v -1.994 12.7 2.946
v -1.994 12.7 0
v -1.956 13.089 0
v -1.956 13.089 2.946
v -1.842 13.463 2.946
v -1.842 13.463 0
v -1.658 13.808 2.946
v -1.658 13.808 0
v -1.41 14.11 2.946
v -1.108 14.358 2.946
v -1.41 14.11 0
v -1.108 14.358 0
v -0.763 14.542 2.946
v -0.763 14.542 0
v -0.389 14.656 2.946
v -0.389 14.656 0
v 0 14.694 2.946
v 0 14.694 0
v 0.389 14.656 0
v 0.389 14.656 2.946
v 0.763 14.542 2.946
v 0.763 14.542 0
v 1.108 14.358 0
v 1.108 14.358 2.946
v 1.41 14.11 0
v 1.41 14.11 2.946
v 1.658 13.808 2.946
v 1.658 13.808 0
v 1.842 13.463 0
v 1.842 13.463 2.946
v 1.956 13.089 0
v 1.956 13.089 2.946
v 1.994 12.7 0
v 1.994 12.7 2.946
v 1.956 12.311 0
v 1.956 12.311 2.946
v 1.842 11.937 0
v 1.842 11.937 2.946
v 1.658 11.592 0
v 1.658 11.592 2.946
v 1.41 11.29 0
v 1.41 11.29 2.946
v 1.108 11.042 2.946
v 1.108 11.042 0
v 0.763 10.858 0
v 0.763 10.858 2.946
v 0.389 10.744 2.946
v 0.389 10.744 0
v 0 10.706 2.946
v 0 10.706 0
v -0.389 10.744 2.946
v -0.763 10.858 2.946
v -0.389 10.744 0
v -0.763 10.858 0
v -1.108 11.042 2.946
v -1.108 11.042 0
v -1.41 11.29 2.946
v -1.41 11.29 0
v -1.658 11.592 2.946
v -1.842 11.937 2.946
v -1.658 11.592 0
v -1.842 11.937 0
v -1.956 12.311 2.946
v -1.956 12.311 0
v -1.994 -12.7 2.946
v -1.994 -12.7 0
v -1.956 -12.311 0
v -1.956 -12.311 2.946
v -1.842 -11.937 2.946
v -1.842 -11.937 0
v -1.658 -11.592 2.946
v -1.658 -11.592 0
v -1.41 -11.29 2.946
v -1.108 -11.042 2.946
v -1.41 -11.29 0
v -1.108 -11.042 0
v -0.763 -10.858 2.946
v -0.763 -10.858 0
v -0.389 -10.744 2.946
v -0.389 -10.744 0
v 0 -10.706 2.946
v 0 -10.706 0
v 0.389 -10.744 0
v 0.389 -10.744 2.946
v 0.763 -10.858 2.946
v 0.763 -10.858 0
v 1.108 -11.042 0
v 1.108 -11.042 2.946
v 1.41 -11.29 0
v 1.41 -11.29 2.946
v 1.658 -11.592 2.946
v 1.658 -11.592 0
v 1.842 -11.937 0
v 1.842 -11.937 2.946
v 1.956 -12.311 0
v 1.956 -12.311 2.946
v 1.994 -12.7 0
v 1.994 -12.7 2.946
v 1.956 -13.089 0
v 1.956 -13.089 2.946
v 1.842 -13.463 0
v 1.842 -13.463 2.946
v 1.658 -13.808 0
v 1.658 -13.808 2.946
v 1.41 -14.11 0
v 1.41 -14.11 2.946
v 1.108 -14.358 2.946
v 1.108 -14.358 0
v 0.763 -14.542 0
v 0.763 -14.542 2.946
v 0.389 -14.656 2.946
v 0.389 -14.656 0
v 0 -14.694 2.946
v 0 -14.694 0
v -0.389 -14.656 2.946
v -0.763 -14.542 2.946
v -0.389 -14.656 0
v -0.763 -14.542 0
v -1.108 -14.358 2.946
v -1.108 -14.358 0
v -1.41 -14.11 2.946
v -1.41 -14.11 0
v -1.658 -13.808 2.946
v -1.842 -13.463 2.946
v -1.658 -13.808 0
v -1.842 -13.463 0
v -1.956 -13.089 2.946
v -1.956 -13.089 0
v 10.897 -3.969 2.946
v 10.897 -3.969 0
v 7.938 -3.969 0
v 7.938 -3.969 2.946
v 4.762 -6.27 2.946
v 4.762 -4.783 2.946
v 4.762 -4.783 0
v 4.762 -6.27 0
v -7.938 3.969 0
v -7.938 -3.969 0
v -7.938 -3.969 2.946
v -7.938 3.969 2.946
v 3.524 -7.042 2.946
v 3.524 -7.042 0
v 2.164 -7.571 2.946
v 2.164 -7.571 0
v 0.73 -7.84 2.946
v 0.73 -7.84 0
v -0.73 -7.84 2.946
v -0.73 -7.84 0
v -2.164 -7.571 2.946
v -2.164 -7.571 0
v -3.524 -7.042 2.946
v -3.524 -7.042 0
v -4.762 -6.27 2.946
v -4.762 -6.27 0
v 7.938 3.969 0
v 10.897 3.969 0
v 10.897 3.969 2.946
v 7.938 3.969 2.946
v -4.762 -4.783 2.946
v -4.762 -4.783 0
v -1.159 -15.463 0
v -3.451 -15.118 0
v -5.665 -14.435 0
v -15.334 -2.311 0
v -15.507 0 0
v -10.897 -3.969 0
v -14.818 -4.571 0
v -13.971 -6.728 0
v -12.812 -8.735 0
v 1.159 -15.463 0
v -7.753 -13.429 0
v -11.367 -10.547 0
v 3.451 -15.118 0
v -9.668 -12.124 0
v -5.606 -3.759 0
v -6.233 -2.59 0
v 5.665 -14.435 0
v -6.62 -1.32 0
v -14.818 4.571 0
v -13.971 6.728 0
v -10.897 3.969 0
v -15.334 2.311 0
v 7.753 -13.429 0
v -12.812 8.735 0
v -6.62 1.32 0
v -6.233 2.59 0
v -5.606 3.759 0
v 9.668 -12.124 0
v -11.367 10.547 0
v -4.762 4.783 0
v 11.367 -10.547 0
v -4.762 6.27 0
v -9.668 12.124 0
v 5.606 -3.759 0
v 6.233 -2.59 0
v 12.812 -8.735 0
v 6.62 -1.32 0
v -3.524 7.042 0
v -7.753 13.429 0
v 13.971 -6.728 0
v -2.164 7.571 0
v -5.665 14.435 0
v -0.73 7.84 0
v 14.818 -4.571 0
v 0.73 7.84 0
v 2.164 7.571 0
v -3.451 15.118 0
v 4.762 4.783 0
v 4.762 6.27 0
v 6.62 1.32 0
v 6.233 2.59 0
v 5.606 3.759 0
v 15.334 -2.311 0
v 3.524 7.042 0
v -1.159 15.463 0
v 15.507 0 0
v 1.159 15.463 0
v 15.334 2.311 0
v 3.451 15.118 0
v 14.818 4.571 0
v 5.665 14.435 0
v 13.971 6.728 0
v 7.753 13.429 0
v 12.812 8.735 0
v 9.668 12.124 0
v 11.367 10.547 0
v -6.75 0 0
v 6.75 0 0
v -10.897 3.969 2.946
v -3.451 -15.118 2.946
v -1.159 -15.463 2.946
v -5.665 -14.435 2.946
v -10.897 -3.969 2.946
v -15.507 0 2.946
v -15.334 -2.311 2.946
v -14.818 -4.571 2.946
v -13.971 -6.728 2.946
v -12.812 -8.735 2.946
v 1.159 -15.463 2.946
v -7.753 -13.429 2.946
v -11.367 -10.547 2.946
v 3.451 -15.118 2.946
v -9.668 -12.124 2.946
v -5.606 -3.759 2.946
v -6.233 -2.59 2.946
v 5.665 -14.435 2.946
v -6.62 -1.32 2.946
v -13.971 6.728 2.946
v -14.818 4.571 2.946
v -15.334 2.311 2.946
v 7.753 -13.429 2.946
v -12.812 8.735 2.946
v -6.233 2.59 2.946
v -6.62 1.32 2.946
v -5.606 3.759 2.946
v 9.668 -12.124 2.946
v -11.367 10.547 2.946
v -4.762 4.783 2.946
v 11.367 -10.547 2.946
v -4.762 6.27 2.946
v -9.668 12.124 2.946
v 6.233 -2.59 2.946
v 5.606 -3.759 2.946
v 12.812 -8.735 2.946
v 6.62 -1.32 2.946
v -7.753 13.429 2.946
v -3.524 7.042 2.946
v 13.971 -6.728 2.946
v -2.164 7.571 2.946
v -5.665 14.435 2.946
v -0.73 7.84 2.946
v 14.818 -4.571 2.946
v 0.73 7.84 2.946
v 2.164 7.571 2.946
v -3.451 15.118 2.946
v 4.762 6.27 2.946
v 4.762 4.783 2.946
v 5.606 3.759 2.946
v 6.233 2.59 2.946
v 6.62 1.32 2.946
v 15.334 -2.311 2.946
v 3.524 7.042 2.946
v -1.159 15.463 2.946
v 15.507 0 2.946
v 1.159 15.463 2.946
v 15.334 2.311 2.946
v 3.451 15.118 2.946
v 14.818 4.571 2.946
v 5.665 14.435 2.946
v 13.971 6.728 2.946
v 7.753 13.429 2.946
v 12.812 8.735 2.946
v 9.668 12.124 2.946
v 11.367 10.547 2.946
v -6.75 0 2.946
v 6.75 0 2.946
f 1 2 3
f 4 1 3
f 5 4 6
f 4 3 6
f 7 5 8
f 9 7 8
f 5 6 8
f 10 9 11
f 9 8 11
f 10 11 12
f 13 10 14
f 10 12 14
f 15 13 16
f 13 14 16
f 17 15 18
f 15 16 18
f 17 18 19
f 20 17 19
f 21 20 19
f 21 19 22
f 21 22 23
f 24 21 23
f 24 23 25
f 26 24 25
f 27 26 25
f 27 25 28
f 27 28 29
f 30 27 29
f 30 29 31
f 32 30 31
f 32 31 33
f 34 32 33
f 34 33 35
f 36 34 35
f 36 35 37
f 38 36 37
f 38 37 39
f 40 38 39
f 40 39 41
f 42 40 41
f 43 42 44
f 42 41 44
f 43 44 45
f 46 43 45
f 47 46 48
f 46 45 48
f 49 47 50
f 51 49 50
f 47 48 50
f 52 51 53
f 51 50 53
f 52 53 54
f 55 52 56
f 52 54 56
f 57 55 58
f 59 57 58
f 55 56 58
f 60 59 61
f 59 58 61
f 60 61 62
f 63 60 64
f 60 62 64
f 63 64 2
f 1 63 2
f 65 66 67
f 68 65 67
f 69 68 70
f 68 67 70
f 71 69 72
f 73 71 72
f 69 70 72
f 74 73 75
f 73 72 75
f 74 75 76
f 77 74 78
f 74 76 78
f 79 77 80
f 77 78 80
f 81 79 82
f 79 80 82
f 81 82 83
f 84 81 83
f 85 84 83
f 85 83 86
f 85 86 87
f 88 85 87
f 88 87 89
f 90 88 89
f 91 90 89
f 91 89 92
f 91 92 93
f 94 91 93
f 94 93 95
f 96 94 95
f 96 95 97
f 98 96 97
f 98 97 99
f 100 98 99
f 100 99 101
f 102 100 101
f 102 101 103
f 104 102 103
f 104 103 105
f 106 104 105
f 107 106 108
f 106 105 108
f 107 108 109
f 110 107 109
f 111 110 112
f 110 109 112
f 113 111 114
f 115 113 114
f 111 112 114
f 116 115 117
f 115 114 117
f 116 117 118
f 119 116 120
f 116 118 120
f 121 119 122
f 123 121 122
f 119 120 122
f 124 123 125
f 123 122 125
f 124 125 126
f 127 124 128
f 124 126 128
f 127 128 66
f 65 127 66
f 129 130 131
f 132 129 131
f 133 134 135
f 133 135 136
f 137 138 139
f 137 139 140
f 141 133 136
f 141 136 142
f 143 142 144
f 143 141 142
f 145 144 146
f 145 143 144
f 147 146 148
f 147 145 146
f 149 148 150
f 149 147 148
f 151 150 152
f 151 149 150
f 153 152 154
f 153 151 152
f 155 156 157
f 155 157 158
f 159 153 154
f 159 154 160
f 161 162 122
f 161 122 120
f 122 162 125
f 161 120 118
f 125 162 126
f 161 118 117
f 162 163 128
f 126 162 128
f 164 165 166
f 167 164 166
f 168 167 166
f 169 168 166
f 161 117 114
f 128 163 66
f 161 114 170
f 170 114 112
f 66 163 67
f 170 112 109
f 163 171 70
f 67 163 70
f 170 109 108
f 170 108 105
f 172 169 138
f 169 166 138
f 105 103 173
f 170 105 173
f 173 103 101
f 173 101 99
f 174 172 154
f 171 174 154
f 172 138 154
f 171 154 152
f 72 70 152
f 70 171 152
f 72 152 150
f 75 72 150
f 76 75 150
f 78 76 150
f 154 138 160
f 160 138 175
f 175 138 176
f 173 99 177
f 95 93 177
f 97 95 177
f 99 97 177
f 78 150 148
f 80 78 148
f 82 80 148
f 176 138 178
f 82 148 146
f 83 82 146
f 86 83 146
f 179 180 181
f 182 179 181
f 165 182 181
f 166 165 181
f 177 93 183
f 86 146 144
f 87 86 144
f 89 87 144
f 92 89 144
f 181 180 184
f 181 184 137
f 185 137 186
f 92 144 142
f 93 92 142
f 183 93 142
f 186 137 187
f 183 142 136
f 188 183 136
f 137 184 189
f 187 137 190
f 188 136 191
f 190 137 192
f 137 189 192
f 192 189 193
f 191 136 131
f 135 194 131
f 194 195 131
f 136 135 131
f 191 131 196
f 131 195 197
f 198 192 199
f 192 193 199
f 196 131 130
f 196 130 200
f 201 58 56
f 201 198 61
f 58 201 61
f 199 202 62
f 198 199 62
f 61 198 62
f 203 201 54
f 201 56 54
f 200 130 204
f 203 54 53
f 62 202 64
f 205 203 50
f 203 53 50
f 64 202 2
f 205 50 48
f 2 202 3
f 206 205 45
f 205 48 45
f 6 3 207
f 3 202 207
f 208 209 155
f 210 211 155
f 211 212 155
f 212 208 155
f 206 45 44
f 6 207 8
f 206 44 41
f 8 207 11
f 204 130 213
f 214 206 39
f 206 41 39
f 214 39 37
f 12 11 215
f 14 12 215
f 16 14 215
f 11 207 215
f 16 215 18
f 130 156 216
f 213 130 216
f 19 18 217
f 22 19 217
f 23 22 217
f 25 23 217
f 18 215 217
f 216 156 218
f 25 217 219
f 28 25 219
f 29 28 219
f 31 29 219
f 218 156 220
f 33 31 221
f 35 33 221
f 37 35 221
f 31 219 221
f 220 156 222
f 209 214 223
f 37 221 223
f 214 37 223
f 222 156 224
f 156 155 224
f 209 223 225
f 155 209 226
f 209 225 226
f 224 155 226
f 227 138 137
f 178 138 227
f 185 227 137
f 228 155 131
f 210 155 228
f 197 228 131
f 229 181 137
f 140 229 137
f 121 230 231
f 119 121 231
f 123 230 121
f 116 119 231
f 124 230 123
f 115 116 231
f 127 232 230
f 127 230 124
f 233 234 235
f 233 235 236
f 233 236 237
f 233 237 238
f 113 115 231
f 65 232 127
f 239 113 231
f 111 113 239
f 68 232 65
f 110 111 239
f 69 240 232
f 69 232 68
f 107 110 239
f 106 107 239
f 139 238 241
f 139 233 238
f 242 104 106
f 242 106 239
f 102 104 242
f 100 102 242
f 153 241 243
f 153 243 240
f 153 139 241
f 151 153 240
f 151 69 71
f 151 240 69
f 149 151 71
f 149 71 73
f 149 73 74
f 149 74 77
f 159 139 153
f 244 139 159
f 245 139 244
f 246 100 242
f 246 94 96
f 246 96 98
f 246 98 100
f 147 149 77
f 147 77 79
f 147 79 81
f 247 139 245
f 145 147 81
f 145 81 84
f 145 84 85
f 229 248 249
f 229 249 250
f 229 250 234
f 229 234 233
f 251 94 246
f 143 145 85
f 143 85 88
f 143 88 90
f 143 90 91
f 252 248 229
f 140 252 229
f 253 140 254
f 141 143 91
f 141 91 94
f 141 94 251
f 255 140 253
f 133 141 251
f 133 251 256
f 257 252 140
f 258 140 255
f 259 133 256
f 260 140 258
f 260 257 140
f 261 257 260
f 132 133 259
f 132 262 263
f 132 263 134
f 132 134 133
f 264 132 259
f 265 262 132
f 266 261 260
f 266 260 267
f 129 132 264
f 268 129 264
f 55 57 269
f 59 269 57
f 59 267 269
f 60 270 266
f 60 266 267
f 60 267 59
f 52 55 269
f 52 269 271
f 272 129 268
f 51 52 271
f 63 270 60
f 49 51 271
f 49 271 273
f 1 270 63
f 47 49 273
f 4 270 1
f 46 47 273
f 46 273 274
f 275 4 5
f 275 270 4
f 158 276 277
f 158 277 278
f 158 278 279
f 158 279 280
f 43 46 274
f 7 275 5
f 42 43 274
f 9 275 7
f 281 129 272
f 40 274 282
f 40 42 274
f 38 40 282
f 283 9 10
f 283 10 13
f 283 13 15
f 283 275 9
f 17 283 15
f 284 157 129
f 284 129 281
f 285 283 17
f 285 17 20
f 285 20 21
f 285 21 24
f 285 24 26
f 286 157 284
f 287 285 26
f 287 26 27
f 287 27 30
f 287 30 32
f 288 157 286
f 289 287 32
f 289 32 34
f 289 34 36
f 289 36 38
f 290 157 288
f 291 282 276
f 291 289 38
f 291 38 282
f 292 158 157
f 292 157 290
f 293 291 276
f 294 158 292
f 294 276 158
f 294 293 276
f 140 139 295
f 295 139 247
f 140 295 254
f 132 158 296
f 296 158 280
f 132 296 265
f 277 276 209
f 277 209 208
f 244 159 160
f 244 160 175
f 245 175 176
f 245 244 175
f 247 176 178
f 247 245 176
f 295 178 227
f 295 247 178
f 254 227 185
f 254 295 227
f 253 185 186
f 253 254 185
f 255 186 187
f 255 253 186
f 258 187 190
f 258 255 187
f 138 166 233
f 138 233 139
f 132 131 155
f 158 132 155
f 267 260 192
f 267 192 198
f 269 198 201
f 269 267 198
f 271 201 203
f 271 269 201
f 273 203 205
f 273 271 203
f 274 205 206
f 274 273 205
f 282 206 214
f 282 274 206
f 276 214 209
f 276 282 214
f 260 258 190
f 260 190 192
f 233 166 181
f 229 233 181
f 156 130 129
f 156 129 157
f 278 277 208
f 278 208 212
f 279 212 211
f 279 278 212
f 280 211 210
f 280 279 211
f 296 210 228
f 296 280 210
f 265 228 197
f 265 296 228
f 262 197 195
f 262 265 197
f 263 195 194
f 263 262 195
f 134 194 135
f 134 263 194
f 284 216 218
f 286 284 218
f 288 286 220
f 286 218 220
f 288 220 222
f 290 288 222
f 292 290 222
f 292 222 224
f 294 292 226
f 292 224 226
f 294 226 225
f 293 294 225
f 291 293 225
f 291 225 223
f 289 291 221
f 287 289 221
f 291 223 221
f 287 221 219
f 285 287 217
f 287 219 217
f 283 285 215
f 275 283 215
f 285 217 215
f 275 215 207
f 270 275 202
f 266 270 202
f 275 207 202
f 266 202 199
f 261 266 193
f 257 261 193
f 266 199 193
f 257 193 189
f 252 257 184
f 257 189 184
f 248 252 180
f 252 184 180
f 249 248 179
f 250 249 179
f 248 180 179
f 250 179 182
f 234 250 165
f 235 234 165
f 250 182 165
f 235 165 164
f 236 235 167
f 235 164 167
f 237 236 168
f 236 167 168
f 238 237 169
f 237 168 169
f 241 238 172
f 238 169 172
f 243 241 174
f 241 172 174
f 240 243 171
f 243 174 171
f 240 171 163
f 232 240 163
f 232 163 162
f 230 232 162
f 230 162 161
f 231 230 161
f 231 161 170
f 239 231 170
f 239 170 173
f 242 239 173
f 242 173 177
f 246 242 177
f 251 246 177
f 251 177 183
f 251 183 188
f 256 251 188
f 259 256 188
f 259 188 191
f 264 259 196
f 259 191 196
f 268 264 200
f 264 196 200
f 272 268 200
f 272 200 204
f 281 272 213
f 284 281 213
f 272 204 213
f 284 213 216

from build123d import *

# Parameters (mm, degrees)
SKETCH1_R                   = 15.5067
BOSS_EXTRUDE1_DEPTH         = 2.9464
CUT_EXTRUDE1_REACH          = 24.127
CUT_EXTRUDE2_REACH          = 24.127
SKETCH3_W                   = 2.9591
SKETCH3_H                   = 7.9375
TAP_DRILL_FOR_4_HELICOIL1_D = 3.9878


with BuildPart() as part:
    # Sketch1 → Boss-Extrude1 (new body)
    with BuildSketch(Plane.XY):
        Circle(SKETCH1_R)
    extrude(amount=BOSS_EXTRUDE1_DEPTH)

    # Sketch2 → Cut-Extrude1 (cut, up to next)
    with BuildSketch(Plane.XY.offset(2.9464), mode=Mode.PRIVATE) as cut_extrude1_sk1:
        with BuildLine():
            Line((4.7625, 6.270444143), (4.7625, 4.783418626))
            ThreePointArc((4.7625, 4.783418626), (6.75, 0), (4.7625, -4.783418626))
            Line((4.7625, -4.783418626), (4.7625, -6.270444143))
            ThreePointArc((4.7625, -6.270444143), (0, -7.874), (-4.7625, -6.270444143))
            Line((-4.7625, -6.270444143), (-4.7625, -4.783418626))
            ThreePointArc((-4.7625, -4.783418626), (-6.75, 0), (-4.7625, 4.783418626))
            Line((-4.7625, 4.783418626), (-4.7625, 6.270444143))
            ThreePointArc((-4.7625, 6.270444143), (0, 7.874), (4.7625, 6.270444143))
        make_face()
    cut_extrude1_tool1 = extrude(cut_extrude1_sk1.sketch, amount=-CUT_EXTRUDE1_REACH, mode=Mode.PRIVATE) & part.part
    add(cut_extrude1_tool1.solids().sort_by_distance((0, 0, 2.9464))[0], mode=Mode.SUBTRACT)

    # Sketch3 → Cut-Extrude2 (cut, up to next)
    with BuildSketch(Plane(origin=(0, 0, 0), x_dir=(-1, 0, 0), z_dir=(0, 0, -1)), mode=Mode.PRIVATE) as cut_extrude2_sk1:
        with Locations((-9.41705, 0)):
            Rectangle(SKETCH3_W, SKETCH3_H)
    cut_extrude2_tool1 = extrude(cut_extrude2_sk1.sketch, amount=-CUT_EXTRUDE2_REACH, mode=Mode.PRIVATE) & part.part
    cut_extrude2 = cut_extrude2_tool1.solids().sort_by_distance((9.41705, 0, 0))[0]
    add(cut_extrude2, mode=Mode.SUBTRACT)

    # Mirror1: Cut-Extrude2 across plane
    add(cut_extrude2.mirror(Plane(origin=(0, 0, 0), x_dir=(0, 0, 1), z_dir=(1, 0, 0))), mode=Mode.SUBTRACT)

    # Tap Drill for #4 Helicoil1 (through all)
    with Locations(Plane.XY.offset(2.9464)):
        with Locations((0, 12.7), (0, -12.7)):
            Hole(TAP_DRILL_FOR_4_HELICOIL1_D / 2)


solid = part.part
